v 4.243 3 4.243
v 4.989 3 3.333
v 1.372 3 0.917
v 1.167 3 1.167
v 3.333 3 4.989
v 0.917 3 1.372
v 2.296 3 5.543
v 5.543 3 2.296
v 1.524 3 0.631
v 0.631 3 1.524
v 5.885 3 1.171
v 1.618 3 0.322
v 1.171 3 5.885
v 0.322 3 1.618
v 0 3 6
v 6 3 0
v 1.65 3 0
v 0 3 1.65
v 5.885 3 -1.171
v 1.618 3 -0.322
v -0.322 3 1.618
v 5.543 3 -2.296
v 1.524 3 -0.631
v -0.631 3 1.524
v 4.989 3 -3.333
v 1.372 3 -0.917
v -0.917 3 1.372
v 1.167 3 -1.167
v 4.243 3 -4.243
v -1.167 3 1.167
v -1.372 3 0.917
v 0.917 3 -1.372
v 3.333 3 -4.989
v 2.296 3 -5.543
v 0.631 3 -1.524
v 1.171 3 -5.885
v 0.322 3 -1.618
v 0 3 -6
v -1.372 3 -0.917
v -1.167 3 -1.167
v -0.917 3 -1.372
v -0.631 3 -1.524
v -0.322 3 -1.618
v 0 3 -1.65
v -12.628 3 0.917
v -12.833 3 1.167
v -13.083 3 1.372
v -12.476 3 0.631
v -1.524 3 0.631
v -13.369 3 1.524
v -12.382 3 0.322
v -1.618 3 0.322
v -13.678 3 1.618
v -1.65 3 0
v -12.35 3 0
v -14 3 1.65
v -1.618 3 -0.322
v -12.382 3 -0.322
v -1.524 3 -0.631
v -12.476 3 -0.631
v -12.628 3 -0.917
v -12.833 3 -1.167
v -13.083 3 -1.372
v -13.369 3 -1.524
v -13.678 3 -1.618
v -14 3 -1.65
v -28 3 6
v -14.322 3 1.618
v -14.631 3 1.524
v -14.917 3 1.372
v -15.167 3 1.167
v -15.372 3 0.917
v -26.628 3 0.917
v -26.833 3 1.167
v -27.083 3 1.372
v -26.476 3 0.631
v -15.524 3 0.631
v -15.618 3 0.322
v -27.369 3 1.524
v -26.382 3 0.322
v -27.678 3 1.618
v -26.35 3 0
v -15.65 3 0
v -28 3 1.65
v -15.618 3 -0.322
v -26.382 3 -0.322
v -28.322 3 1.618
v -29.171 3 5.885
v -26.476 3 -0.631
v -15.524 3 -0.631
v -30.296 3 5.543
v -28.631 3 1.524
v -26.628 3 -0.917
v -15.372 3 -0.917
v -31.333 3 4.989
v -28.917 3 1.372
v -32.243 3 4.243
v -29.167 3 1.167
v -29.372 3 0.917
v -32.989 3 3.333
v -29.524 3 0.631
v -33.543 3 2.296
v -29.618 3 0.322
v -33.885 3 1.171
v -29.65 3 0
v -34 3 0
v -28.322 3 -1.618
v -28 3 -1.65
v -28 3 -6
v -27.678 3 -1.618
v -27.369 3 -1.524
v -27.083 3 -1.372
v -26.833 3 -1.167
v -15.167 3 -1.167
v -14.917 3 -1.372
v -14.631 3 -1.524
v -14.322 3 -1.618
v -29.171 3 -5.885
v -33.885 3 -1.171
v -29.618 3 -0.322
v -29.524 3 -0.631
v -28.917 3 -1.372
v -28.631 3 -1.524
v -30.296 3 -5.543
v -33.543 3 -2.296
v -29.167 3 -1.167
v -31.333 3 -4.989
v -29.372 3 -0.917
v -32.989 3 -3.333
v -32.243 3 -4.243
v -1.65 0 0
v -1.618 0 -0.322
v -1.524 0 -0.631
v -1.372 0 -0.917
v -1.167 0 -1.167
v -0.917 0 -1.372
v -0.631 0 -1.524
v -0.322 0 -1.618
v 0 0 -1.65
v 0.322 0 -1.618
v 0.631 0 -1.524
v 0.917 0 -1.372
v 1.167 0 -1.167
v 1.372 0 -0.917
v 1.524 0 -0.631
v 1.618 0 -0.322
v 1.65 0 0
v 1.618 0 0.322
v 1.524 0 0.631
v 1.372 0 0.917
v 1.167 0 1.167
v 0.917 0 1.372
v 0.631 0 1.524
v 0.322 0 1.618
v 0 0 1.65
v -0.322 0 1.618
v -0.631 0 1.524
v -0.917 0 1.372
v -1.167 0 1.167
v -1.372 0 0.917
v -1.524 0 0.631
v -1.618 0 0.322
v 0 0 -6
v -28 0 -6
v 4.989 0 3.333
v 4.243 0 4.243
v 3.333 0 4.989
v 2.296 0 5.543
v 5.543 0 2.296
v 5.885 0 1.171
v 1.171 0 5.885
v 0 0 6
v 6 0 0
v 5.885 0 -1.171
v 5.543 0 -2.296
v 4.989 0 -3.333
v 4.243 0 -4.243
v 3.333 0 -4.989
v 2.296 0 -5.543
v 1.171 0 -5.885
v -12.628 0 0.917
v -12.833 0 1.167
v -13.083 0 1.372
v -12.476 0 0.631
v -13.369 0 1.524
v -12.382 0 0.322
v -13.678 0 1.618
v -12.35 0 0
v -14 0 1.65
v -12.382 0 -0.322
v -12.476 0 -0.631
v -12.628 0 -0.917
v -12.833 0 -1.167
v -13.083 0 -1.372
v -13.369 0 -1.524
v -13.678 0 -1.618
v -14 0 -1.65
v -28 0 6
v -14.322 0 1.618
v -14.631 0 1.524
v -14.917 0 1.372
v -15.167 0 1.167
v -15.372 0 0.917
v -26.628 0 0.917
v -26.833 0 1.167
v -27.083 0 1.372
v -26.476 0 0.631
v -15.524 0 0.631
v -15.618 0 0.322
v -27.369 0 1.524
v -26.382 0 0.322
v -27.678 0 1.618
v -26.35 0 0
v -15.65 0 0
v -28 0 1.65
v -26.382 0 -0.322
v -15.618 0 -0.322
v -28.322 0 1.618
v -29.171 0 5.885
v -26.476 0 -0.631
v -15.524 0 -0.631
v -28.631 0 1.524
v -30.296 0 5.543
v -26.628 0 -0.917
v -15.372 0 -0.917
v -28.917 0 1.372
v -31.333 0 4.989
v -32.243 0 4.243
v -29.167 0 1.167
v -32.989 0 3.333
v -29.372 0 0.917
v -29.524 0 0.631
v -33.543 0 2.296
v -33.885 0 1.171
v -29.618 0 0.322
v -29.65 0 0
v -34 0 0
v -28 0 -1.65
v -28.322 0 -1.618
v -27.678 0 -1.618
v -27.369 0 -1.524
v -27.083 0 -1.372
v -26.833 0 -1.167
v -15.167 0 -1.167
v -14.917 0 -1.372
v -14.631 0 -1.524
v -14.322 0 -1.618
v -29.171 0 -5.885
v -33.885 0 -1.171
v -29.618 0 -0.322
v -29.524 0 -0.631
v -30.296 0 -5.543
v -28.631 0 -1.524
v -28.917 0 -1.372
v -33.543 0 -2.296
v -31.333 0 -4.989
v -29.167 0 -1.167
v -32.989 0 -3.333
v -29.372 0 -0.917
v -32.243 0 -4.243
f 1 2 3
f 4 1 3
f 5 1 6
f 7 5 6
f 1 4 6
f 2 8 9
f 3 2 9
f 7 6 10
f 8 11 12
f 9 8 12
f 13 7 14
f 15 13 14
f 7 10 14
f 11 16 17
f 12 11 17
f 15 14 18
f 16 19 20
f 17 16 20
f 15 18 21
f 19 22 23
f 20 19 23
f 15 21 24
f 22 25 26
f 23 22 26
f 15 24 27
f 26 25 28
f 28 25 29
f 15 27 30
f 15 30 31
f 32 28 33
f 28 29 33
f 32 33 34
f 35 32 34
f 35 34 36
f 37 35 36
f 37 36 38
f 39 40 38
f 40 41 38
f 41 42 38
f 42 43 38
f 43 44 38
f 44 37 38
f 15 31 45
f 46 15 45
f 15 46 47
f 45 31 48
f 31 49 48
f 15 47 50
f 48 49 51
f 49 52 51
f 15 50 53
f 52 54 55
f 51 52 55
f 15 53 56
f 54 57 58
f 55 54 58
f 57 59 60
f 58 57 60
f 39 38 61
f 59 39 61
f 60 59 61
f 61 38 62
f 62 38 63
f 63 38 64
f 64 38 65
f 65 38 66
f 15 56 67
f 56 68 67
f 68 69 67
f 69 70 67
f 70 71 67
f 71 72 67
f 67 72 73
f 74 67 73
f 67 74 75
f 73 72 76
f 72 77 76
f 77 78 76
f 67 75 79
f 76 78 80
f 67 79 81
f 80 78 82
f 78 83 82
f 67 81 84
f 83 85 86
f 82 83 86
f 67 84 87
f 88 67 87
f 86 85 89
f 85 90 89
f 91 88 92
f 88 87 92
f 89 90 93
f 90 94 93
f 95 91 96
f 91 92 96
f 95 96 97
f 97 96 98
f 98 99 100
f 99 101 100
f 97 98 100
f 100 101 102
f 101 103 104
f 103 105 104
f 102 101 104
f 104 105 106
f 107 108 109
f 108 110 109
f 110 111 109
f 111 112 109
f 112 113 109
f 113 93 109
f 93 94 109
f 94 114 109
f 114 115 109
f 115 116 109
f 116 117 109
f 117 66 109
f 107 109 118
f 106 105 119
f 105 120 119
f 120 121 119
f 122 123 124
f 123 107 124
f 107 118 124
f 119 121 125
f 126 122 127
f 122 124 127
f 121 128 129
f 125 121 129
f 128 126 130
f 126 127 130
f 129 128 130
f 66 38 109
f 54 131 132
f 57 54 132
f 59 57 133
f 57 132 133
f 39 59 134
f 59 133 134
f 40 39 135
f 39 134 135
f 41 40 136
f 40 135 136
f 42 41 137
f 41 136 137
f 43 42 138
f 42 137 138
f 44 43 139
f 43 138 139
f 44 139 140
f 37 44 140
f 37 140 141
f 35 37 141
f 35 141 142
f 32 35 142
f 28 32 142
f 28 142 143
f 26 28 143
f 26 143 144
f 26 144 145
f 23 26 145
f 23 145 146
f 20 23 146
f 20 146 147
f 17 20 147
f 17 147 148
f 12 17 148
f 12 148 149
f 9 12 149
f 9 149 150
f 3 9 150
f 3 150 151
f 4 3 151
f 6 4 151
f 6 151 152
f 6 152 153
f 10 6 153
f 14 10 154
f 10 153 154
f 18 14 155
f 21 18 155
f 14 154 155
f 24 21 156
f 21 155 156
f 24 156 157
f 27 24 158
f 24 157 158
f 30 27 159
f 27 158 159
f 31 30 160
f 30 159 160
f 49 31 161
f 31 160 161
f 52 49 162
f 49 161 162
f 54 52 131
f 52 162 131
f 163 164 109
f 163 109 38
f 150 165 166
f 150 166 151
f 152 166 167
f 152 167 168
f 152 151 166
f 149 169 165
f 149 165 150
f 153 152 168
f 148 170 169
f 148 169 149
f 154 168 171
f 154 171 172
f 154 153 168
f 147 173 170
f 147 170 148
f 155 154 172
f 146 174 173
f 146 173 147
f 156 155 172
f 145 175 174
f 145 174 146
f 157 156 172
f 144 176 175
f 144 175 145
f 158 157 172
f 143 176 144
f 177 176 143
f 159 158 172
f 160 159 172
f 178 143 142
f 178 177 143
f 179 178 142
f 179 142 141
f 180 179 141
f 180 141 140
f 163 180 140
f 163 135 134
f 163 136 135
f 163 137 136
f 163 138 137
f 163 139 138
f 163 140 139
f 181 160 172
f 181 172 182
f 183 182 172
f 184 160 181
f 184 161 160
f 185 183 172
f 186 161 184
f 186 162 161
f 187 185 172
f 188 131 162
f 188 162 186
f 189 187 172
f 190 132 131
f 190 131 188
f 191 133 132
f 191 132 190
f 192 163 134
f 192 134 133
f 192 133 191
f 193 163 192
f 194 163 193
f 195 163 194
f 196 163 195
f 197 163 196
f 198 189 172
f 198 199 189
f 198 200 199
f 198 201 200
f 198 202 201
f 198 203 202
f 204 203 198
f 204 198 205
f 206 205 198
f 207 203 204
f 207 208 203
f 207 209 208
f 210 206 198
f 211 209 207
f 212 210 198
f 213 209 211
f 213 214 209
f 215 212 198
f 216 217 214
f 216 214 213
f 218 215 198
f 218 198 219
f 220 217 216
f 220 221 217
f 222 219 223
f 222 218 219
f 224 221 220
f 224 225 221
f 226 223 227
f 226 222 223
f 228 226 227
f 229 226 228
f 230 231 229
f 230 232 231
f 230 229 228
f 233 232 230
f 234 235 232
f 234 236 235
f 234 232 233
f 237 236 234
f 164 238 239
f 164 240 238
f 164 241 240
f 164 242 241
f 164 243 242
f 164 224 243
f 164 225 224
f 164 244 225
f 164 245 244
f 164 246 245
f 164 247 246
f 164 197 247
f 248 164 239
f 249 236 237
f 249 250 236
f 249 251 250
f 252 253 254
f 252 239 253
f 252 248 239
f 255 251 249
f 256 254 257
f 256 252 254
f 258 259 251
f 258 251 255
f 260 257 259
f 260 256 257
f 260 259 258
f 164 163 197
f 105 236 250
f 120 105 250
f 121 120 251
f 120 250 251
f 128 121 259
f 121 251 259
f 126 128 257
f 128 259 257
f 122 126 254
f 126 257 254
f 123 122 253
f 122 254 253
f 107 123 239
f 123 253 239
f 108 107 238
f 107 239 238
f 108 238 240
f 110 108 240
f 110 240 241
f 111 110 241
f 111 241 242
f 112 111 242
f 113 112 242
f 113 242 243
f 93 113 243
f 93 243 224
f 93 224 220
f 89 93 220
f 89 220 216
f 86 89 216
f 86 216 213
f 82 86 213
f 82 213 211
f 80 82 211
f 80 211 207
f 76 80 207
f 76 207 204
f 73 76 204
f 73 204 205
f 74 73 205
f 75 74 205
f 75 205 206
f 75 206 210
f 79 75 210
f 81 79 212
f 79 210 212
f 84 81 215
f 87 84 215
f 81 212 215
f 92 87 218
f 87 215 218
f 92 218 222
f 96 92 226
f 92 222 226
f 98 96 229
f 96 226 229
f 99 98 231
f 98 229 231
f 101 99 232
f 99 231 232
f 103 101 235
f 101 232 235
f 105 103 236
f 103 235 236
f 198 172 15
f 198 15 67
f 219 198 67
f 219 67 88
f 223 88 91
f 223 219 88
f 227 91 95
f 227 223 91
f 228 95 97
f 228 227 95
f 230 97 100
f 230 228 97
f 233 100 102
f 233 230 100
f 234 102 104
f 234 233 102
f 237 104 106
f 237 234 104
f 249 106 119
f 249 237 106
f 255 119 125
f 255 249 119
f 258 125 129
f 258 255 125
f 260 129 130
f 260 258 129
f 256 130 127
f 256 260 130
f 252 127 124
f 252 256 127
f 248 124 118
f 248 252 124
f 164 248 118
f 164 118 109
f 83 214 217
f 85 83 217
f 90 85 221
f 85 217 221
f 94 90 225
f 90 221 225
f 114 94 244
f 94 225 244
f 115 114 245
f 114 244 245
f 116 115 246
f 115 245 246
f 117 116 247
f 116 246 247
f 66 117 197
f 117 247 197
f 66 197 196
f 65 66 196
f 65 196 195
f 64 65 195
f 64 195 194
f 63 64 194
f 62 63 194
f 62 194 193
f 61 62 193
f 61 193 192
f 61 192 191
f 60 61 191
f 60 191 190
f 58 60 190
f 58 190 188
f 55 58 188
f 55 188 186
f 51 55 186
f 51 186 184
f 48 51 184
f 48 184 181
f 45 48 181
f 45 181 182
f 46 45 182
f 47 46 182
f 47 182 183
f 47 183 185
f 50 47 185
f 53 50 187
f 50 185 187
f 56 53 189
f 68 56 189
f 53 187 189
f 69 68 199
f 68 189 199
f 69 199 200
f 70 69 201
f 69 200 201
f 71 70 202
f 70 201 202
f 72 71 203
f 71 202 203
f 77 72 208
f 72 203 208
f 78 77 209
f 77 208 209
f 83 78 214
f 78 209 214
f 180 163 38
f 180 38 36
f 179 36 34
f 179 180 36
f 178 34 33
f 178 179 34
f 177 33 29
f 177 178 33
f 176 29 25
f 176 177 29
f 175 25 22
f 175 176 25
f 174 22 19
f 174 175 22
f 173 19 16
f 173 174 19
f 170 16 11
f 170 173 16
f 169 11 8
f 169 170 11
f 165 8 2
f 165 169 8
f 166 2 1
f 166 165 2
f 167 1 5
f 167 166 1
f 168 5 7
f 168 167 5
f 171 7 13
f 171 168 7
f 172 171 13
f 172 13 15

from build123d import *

# Parameters (mm, degrees)
BOSS_EXTRUDE2_DEPTH       = 3
M4X0_7_TAPPED_HOLE2_D     = 3.3
M4X0_7_TAPPED_HOLE2_DEPTH = 10.1
M4X0_7_TAPPED_HOLE2_TIP   = 0.991420021


with BuildPart() as part:
    # Sketch1 → Boss-Extrude2 (new body)
    with BuildSketch(Plane(origin=(0, 0, 0), x_dir=(1, 0, 0), z_dir=(0, 1, 0))):
        with BuildLine():
            Line((-28, 6), (0, 6))
            ThreePointArc((0, 6), (6, 0), (0, -6))
            Line((0, -6), (-28, -6))
            ThreePointArc((-28, -6), (-34, 0), (-28, 6))
        make_face()
    extrude(amount=BOSS_EXTRUDE2_DEPTH)

    # M4x0.7 Tapped Hole2
    with Locations(Plane(origin=(0, 3, 0), x_dir=(1, 0, 0), z_dir=(0, 1, 0))):
        with Locations((0, 0), (-14, 0), (-28, 0)):
            Hole(M4X0_7_TAPPED_HOLE2_D / 2, depth=M4X0_7_TAPPED_HOLE2_DEPTH)
            with Locations((0, 0, -(M4X0_7_TAPPED_HOLE2_DEPTH + M4X0_7_TAPPED_HOLE2_TIP / 2))):  # 118° drill point
                Cone(0, M4X0_7_TAPPED_HOLE2_D / 2, M4X0_7_TAPPED_HOLE2_TIP, mode=Mode.SUBTRACT)


solid = part.part
